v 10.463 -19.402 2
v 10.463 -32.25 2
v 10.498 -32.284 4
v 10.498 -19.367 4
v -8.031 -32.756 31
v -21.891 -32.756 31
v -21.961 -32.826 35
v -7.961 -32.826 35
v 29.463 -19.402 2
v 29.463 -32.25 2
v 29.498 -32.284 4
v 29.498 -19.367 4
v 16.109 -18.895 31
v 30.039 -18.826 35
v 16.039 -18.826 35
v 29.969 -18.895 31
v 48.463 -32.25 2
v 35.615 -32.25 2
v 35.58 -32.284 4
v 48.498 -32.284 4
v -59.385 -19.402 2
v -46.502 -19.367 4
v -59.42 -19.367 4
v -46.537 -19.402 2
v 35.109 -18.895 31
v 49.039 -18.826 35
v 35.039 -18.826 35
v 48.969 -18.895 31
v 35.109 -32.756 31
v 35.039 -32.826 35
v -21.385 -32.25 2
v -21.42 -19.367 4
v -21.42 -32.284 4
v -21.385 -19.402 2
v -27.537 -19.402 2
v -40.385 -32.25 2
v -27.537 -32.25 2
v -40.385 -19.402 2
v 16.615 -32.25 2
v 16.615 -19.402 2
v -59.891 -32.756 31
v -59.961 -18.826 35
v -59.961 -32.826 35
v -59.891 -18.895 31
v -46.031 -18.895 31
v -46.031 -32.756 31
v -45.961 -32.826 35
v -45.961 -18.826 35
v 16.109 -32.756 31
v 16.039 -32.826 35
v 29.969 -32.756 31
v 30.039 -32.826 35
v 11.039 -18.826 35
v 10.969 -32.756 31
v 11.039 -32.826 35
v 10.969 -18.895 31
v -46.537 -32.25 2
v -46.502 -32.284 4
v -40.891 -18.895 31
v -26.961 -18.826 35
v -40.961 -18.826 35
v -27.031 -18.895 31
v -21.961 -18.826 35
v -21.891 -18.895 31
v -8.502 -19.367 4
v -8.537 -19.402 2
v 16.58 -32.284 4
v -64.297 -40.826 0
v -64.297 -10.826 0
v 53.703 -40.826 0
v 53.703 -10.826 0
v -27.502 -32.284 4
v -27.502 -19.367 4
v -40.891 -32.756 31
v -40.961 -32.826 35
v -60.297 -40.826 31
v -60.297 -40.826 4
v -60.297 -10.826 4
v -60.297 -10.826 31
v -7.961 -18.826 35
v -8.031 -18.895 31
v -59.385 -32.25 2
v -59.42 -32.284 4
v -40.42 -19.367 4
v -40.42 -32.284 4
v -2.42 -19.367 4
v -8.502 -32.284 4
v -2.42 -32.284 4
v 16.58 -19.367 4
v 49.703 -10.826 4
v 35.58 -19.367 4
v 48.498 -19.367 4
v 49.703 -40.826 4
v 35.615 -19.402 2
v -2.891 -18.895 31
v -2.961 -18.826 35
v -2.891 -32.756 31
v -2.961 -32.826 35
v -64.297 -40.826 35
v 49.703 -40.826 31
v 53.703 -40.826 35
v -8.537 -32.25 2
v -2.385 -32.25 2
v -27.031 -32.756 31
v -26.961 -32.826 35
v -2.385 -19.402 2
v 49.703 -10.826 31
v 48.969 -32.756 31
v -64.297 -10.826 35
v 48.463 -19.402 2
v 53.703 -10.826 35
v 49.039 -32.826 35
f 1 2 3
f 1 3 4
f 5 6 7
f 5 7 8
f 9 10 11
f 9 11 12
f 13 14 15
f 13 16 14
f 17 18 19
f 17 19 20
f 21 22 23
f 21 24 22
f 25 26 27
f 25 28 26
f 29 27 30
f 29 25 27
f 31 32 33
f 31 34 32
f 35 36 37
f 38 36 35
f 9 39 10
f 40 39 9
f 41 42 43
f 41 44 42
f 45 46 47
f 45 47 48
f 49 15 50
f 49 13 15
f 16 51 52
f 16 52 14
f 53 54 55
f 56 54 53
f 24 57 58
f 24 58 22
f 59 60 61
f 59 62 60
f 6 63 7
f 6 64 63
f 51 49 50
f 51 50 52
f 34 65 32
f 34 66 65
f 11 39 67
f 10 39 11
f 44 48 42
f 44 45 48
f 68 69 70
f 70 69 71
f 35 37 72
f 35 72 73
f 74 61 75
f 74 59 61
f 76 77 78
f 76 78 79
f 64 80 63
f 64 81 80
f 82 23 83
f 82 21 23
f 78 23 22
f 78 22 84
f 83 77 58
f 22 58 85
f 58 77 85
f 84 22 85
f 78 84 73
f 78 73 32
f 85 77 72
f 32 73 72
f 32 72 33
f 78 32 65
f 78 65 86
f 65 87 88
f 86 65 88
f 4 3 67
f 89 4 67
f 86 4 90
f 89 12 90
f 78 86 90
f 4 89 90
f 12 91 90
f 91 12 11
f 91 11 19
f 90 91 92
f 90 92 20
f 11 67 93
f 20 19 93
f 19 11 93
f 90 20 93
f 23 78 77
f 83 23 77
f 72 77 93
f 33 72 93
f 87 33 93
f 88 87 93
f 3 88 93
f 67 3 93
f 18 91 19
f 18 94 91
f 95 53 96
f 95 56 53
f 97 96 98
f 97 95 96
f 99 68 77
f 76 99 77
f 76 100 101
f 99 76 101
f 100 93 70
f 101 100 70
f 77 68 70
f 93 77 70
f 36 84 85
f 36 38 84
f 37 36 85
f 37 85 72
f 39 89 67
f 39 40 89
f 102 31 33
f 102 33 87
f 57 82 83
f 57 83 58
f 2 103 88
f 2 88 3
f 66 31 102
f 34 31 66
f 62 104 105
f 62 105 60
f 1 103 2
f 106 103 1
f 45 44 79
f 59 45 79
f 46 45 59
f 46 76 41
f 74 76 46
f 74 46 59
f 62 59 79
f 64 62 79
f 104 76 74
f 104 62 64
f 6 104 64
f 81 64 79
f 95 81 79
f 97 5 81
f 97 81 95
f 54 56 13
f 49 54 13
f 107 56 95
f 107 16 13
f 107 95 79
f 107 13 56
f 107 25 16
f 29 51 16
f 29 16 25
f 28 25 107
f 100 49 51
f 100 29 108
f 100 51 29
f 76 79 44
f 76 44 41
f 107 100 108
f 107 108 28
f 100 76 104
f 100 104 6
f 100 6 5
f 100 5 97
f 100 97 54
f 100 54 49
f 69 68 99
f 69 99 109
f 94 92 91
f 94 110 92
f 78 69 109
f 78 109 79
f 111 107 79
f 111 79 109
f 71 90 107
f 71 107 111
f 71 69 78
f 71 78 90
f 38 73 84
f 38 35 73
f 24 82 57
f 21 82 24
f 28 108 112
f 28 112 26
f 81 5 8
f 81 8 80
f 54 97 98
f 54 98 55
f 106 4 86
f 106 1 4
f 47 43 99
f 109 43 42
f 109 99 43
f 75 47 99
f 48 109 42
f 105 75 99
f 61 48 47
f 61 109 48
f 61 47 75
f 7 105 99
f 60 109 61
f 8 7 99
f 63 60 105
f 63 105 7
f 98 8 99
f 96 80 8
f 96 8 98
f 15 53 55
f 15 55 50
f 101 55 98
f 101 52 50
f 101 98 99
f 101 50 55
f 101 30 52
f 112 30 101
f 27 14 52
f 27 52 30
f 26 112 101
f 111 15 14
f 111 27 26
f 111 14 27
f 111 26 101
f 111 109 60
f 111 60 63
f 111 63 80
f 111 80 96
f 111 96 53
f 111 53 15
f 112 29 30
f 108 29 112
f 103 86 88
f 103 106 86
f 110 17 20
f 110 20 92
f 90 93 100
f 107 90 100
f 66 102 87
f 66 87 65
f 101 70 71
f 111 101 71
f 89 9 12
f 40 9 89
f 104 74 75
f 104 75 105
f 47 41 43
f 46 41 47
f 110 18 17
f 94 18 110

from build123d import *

# Parameters (mm, degrees)
F0_W     = 118
F0_H     = 30
F1_DEPTH = 35
F2_W     = 14
F2_H     = 14
F3_DEPTH = 33
F3_TAPER = 1
F4_W     = 110
F4_H     = 27
F5_DEPTH = 30


with BuildPart() as f1:
    # F0 (on Top) → F1 (new body)
    with BuildSketch(Plane.XY):
        with Locations((-5.2966810763, -25.8255312847)):
            Rectangle(F0_W, F0_H)
    extrude(amount=F1_DEPTH)

    # F2 (on face) → F3 (cut)
    with BuildSketch(Plane.XY.offset(35)):
        with Locations((-52.9612515788, -25.8255312847)):
            Rectangle(F2_W, F2_H)
        with Locations((-33.9612515788, -25.8255312847)):
            Rectangle(F2_W, F2_H)
        with Locations((-14.9612515788, -25.8255312847)):
            Rectangle(F2_W, F2_H)
        with Locations((4.0387484212, -25.8255312847)):
            Rectangle(F2_W, F2_H)
        with Locations((23.0387484212, -25.8255312847)):
            Rectangle(F2_W, F2_H)
        with Locations((42.0387484212, -25.8255312847)):
            Rectangle(F2_W, F2_H)
    extrude(amount=-F3_DEPTH, taper=F3_TAPER, mode=Mode.SUBTRACT)

    # F4 (on face) → F5 (cut)
    with BuildSketch(Plane.XZ.offset(40.8255312847)):
        with Locations((-5.2966810763, 17.5)):
            Rectangle(F4_W, F4_H)
    extrude(amount=-F5_DEPTH, mode=Mode.SUBTRACT)


solid = f1.part
